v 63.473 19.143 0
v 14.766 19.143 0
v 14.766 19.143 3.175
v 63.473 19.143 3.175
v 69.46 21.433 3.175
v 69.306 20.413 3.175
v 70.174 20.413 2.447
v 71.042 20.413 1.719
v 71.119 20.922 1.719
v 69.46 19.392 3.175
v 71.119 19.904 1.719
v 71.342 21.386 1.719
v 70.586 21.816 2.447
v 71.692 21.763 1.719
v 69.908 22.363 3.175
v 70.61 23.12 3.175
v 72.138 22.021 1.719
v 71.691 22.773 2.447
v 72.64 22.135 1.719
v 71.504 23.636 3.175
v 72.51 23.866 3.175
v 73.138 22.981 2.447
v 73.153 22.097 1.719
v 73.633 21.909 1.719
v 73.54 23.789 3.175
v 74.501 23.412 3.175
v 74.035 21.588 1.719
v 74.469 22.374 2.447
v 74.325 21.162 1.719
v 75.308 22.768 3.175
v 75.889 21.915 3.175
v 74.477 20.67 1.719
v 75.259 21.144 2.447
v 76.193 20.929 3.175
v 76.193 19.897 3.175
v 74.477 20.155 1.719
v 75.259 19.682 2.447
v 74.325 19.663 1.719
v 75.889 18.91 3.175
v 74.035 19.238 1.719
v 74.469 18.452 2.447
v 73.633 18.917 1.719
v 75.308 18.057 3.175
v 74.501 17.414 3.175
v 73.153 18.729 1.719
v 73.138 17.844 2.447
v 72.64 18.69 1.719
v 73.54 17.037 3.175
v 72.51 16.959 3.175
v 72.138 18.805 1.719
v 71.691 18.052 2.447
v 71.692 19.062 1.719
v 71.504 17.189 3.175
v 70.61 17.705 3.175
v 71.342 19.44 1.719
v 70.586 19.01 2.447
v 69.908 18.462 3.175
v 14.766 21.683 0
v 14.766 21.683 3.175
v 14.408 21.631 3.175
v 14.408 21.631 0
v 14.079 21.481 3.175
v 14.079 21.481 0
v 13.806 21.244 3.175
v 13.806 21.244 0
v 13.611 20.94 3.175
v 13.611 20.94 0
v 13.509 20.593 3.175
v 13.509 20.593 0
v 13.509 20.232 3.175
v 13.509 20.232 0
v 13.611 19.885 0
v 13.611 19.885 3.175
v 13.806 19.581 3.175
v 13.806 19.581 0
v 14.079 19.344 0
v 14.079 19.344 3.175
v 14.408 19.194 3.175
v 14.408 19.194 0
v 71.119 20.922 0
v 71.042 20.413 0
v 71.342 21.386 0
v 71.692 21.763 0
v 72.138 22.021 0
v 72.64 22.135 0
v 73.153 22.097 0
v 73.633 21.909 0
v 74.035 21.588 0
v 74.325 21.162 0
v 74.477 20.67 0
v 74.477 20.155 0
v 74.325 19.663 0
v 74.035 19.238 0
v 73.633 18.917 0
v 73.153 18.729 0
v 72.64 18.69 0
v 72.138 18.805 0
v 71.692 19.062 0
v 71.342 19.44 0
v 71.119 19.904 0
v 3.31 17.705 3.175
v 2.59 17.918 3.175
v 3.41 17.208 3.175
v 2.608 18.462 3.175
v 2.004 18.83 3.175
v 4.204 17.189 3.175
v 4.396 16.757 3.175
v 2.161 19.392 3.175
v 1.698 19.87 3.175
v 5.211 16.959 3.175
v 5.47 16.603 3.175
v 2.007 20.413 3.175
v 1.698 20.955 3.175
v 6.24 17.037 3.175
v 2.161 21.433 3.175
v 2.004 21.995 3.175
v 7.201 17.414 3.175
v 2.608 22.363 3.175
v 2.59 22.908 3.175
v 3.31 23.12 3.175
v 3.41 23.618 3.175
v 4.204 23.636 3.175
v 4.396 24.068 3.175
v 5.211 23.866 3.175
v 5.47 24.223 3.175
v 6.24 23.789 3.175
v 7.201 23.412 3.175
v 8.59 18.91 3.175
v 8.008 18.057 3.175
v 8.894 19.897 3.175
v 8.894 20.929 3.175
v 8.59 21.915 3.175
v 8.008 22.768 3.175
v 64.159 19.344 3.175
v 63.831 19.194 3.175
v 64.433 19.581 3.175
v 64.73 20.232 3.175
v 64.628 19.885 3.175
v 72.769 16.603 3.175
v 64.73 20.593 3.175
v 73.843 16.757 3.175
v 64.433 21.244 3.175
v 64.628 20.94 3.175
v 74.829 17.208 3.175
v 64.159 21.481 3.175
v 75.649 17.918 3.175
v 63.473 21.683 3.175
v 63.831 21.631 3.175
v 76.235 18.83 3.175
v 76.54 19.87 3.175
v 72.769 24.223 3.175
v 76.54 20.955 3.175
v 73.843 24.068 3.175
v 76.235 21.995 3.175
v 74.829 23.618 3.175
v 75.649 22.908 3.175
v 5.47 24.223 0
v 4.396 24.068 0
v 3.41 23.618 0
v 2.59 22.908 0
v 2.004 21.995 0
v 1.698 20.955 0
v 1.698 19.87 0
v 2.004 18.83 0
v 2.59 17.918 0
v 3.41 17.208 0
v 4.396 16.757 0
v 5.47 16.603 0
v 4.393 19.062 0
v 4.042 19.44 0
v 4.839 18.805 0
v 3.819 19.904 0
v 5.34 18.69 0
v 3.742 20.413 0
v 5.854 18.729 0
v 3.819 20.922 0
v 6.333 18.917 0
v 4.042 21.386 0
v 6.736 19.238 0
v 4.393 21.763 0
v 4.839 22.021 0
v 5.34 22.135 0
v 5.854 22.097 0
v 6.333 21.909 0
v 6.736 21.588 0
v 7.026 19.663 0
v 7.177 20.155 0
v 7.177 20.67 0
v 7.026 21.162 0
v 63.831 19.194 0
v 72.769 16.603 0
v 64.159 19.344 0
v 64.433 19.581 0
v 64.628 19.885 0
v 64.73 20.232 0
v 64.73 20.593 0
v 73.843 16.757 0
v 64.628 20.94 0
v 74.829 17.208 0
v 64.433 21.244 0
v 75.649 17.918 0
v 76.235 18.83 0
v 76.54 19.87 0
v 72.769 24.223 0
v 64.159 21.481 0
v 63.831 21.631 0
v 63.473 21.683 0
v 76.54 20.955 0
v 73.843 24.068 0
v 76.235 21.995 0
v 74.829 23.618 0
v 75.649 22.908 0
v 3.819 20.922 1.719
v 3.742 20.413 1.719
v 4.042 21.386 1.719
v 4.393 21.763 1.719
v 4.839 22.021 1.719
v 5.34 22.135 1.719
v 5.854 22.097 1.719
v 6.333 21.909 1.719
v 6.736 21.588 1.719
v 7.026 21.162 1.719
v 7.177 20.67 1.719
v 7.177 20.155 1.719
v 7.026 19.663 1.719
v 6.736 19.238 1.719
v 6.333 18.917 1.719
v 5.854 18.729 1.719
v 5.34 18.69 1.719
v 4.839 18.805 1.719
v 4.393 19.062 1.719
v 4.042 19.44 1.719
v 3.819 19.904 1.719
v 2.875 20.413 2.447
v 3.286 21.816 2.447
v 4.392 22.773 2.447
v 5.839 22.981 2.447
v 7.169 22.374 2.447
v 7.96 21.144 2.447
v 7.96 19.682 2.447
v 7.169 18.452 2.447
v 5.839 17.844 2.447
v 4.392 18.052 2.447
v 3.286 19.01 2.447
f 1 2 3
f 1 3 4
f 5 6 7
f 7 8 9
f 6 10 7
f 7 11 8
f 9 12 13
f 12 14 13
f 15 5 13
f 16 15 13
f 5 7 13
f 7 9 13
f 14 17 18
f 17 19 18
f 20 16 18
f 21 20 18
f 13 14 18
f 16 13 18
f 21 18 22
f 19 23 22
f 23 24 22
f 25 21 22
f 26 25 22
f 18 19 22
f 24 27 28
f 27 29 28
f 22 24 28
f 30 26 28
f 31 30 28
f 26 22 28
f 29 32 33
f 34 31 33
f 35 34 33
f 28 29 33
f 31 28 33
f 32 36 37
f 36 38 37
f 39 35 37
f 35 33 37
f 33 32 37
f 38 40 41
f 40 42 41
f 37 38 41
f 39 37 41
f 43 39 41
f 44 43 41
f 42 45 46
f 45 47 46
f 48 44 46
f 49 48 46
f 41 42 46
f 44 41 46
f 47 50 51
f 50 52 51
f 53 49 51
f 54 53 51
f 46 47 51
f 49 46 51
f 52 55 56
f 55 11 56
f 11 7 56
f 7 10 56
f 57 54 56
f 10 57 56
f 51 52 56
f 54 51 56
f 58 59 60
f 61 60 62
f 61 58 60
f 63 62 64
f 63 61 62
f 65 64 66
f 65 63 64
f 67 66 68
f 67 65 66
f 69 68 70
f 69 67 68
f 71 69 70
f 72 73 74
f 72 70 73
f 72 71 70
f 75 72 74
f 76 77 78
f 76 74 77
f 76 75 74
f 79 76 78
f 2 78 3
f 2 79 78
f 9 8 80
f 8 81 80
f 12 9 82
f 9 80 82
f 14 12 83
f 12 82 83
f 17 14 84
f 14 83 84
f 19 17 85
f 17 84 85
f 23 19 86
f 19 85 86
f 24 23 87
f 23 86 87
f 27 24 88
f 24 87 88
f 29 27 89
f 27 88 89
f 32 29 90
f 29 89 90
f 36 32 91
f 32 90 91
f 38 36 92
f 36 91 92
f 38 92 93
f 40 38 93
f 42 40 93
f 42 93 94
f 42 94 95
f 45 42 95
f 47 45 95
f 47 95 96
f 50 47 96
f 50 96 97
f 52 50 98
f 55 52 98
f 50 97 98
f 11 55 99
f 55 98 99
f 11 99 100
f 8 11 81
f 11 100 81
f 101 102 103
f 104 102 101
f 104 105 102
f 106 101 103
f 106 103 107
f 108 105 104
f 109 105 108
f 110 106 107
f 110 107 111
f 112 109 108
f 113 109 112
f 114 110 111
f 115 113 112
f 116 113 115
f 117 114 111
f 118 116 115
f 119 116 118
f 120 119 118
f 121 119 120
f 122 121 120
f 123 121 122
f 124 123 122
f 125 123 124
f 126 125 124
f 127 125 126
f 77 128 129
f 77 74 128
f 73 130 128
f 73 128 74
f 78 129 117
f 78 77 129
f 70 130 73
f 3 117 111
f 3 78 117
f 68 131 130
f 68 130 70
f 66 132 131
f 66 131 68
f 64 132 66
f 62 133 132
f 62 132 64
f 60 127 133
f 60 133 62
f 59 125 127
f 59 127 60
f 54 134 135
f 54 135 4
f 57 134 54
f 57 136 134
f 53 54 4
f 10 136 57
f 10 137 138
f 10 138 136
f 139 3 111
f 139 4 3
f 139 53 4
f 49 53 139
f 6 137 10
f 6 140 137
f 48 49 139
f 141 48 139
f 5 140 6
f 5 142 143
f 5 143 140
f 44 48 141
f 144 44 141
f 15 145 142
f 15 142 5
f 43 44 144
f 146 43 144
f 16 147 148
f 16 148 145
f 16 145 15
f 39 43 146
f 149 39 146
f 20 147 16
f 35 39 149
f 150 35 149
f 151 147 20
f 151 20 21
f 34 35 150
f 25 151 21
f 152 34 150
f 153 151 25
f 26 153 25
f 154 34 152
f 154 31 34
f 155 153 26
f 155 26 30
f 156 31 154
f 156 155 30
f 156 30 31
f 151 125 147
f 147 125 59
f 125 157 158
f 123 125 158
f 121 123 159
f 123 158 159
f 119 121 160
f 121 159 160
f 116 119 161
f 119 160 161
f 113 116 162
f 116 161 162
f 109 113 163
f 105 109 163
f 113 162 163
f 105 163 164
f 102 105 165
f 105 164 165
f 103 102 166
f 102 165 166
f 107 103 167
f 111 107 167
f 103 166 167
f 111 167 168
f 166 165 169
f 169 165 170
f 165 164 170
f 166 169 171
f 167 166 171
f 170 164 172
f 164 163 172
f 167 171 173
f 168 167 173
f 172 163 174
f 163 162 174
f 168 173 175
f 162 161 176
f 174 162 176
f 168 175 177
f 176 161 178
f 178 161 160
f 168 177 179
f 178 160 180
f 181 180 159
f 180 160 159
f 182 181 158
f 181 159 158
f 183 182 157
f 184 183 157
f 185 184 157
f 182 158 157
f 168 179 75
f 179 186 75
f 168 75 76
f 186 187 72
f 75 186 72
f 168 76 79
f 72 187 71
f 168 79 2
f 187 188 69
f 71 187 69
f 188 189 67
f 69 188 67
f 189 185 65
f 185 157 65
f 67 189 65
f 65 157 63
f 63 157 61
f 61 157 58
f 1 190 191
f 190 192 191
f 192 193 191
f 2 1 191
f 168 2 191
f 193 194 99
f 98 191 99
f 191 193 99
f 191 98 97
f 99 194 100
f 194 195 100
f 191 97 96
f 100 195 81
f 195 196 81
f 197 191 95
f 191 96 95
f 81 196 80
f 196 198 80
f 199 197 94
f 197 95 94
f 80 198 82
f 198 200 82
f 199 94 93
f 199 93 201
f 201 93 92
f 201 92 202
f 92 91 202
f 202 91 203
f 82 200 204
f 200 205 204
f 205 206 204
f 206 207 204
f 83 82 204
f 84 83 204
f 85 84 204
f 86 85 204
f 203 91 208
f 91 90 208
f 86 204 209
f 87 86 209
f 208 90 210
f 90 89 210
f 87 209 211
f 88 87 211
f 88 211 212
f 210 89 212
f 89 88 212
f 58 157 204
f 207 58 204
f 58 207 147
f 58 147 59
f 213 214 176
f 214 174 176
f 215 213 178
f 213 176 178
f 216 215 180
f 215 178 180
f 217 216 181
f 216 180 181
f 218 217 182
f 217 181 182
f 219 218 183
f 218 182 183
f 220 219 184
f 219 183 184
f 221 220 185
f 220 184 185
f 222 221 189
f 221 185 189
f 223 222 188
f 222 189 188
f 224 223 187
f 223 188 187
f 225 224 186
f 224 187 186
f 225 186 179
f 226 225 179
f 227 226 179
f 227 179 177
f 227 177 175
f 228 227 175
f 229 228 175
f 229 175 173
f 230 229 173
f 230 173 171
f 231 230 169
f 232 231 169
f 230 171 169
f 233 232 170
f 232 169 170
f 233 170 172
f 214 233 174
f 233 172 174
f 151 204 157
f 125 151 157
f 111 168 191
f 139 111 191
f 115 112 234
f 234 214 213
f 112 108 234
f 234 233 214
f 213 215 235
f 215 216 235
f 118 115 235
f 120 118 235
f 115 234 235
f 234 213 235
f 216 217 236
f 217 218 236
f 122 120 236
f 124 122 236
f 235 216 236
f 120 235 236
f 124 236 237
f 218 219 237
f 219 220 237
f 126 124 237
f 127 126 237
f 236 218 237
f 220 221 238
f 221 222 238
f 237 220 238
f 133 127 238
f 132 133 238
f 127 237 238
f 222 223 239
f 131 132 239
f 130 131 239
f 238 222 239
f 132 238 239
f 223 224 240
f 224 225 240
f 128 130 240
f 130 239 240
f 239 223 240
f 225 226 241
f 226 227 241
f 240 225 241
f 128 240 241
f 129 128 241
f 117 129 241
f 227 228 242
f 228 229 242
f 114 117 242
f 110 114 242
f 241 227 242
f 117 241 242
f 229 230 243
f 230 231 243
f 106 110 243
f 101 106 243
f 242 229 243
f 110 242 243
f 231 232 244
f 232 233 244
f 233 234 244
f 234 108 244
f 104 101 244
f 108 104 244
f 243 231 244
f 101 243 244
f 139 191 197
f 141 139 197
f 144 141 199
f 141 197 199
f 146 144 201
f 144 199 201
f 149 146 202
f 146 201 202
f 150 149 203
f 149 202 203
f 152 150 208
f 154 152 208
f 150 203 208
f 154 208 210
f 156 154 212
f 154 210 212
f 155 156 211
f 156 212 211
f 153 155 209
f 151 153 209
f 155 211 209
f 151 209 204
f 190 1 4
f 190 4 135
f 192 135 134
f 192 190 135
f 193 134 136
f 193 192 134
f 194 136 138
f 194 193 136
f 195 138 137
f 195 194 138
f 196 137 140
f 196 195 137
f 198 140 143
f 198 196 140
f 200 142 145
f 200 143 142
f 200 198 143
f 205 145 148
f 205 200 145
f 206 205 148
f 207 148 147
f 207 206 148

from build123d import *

# Parameters (mm, degrees)
BOSS_EXTRUDE1_DEPTH                               = 3.175
CSK_FOR_4_FLAT_HEAD_MACHINE_SCREW_100_D           = 3.4544
CSK_FOR_4_FLAT_HEAD_MACHINE_SCREW_100_CSINK_D     = 6.925818
CSK_FOR_4_FLAT_HEAD_MACHINE_SCREW_100_CSINK_ANGLE = 100
CUT_EXTRUDE1_DEPTH                                = 4.175


with BuildPart() as part:
    # Sketch1 → Boss-Extrude1 (new body)
    with BuildSketch(Plane.XY):
        with BuildLine():
            Line((5.469571116, 16.602717302), (72.76915781, 16.602717302))
            ThreePointArc((72.76915781, 16.602717302), (76.57915781, 20.412717302), (72.76915781, 24.222717302))
            Line((72.76915781, 24.222717302), (5.469571116, 24.222717302))
            ThreePointArc((5.469571116, 24.222717302), (1.659571116, 20.412717302), (5.469571116, 16.602717302))
        make_face()
    extrude(amount=BOSS_EXTRUDE1_DEPTH)

    # CSK for #4 Flat Head Machine Screw (100)1 (through all)
    with Locations(Plane.XY.offset(3.175)):
        with Locations((5.469571116, 20.412717302), (72.76915781, 20.412717302)):
            CounterSinkHole(CSK_FOR_4_FLAT_HEAD_MACHINE_SCREW_100_D / 2, CSK_FOR_4_FLAT_HEAD_MACHINE_SCREW_100_CSINK_D / 2, counter_sink_angle=CSK_FOR_4_FLAT_HEAD_MACHINE_SCREW_100_CSINK_ANGLE)

    # Sketch4 → Cut-Extrude1 (cut, through all)
    with BuildSketch(Plane(origin=(0, 0, 0), x_dir=(-1, 0, 0), z_dir=(0, 0, -1))):
        with BuildLine():
            Line((-63.47275781, 21.682717302), (-14.765971116, 21.682717302))
            ThreePointArc((-14.765971116, 21.682717302), (-13.495971116, 20.412717302), (-14.765971116, 19.142717302))
            Line((-14.765971116, 19.142717302), (-63.47275781, 19.142717302))
            ThreePointArc((-63.47275781, 19.142717302), (-64.74275781, 20.412717302), (-63.47275781, 21.682717302))
        make_face()
    extrude(amount=-CUT_EXTRUDE1_DEPTH, mode=Mode.SUBTRACT)


solid = part.part
